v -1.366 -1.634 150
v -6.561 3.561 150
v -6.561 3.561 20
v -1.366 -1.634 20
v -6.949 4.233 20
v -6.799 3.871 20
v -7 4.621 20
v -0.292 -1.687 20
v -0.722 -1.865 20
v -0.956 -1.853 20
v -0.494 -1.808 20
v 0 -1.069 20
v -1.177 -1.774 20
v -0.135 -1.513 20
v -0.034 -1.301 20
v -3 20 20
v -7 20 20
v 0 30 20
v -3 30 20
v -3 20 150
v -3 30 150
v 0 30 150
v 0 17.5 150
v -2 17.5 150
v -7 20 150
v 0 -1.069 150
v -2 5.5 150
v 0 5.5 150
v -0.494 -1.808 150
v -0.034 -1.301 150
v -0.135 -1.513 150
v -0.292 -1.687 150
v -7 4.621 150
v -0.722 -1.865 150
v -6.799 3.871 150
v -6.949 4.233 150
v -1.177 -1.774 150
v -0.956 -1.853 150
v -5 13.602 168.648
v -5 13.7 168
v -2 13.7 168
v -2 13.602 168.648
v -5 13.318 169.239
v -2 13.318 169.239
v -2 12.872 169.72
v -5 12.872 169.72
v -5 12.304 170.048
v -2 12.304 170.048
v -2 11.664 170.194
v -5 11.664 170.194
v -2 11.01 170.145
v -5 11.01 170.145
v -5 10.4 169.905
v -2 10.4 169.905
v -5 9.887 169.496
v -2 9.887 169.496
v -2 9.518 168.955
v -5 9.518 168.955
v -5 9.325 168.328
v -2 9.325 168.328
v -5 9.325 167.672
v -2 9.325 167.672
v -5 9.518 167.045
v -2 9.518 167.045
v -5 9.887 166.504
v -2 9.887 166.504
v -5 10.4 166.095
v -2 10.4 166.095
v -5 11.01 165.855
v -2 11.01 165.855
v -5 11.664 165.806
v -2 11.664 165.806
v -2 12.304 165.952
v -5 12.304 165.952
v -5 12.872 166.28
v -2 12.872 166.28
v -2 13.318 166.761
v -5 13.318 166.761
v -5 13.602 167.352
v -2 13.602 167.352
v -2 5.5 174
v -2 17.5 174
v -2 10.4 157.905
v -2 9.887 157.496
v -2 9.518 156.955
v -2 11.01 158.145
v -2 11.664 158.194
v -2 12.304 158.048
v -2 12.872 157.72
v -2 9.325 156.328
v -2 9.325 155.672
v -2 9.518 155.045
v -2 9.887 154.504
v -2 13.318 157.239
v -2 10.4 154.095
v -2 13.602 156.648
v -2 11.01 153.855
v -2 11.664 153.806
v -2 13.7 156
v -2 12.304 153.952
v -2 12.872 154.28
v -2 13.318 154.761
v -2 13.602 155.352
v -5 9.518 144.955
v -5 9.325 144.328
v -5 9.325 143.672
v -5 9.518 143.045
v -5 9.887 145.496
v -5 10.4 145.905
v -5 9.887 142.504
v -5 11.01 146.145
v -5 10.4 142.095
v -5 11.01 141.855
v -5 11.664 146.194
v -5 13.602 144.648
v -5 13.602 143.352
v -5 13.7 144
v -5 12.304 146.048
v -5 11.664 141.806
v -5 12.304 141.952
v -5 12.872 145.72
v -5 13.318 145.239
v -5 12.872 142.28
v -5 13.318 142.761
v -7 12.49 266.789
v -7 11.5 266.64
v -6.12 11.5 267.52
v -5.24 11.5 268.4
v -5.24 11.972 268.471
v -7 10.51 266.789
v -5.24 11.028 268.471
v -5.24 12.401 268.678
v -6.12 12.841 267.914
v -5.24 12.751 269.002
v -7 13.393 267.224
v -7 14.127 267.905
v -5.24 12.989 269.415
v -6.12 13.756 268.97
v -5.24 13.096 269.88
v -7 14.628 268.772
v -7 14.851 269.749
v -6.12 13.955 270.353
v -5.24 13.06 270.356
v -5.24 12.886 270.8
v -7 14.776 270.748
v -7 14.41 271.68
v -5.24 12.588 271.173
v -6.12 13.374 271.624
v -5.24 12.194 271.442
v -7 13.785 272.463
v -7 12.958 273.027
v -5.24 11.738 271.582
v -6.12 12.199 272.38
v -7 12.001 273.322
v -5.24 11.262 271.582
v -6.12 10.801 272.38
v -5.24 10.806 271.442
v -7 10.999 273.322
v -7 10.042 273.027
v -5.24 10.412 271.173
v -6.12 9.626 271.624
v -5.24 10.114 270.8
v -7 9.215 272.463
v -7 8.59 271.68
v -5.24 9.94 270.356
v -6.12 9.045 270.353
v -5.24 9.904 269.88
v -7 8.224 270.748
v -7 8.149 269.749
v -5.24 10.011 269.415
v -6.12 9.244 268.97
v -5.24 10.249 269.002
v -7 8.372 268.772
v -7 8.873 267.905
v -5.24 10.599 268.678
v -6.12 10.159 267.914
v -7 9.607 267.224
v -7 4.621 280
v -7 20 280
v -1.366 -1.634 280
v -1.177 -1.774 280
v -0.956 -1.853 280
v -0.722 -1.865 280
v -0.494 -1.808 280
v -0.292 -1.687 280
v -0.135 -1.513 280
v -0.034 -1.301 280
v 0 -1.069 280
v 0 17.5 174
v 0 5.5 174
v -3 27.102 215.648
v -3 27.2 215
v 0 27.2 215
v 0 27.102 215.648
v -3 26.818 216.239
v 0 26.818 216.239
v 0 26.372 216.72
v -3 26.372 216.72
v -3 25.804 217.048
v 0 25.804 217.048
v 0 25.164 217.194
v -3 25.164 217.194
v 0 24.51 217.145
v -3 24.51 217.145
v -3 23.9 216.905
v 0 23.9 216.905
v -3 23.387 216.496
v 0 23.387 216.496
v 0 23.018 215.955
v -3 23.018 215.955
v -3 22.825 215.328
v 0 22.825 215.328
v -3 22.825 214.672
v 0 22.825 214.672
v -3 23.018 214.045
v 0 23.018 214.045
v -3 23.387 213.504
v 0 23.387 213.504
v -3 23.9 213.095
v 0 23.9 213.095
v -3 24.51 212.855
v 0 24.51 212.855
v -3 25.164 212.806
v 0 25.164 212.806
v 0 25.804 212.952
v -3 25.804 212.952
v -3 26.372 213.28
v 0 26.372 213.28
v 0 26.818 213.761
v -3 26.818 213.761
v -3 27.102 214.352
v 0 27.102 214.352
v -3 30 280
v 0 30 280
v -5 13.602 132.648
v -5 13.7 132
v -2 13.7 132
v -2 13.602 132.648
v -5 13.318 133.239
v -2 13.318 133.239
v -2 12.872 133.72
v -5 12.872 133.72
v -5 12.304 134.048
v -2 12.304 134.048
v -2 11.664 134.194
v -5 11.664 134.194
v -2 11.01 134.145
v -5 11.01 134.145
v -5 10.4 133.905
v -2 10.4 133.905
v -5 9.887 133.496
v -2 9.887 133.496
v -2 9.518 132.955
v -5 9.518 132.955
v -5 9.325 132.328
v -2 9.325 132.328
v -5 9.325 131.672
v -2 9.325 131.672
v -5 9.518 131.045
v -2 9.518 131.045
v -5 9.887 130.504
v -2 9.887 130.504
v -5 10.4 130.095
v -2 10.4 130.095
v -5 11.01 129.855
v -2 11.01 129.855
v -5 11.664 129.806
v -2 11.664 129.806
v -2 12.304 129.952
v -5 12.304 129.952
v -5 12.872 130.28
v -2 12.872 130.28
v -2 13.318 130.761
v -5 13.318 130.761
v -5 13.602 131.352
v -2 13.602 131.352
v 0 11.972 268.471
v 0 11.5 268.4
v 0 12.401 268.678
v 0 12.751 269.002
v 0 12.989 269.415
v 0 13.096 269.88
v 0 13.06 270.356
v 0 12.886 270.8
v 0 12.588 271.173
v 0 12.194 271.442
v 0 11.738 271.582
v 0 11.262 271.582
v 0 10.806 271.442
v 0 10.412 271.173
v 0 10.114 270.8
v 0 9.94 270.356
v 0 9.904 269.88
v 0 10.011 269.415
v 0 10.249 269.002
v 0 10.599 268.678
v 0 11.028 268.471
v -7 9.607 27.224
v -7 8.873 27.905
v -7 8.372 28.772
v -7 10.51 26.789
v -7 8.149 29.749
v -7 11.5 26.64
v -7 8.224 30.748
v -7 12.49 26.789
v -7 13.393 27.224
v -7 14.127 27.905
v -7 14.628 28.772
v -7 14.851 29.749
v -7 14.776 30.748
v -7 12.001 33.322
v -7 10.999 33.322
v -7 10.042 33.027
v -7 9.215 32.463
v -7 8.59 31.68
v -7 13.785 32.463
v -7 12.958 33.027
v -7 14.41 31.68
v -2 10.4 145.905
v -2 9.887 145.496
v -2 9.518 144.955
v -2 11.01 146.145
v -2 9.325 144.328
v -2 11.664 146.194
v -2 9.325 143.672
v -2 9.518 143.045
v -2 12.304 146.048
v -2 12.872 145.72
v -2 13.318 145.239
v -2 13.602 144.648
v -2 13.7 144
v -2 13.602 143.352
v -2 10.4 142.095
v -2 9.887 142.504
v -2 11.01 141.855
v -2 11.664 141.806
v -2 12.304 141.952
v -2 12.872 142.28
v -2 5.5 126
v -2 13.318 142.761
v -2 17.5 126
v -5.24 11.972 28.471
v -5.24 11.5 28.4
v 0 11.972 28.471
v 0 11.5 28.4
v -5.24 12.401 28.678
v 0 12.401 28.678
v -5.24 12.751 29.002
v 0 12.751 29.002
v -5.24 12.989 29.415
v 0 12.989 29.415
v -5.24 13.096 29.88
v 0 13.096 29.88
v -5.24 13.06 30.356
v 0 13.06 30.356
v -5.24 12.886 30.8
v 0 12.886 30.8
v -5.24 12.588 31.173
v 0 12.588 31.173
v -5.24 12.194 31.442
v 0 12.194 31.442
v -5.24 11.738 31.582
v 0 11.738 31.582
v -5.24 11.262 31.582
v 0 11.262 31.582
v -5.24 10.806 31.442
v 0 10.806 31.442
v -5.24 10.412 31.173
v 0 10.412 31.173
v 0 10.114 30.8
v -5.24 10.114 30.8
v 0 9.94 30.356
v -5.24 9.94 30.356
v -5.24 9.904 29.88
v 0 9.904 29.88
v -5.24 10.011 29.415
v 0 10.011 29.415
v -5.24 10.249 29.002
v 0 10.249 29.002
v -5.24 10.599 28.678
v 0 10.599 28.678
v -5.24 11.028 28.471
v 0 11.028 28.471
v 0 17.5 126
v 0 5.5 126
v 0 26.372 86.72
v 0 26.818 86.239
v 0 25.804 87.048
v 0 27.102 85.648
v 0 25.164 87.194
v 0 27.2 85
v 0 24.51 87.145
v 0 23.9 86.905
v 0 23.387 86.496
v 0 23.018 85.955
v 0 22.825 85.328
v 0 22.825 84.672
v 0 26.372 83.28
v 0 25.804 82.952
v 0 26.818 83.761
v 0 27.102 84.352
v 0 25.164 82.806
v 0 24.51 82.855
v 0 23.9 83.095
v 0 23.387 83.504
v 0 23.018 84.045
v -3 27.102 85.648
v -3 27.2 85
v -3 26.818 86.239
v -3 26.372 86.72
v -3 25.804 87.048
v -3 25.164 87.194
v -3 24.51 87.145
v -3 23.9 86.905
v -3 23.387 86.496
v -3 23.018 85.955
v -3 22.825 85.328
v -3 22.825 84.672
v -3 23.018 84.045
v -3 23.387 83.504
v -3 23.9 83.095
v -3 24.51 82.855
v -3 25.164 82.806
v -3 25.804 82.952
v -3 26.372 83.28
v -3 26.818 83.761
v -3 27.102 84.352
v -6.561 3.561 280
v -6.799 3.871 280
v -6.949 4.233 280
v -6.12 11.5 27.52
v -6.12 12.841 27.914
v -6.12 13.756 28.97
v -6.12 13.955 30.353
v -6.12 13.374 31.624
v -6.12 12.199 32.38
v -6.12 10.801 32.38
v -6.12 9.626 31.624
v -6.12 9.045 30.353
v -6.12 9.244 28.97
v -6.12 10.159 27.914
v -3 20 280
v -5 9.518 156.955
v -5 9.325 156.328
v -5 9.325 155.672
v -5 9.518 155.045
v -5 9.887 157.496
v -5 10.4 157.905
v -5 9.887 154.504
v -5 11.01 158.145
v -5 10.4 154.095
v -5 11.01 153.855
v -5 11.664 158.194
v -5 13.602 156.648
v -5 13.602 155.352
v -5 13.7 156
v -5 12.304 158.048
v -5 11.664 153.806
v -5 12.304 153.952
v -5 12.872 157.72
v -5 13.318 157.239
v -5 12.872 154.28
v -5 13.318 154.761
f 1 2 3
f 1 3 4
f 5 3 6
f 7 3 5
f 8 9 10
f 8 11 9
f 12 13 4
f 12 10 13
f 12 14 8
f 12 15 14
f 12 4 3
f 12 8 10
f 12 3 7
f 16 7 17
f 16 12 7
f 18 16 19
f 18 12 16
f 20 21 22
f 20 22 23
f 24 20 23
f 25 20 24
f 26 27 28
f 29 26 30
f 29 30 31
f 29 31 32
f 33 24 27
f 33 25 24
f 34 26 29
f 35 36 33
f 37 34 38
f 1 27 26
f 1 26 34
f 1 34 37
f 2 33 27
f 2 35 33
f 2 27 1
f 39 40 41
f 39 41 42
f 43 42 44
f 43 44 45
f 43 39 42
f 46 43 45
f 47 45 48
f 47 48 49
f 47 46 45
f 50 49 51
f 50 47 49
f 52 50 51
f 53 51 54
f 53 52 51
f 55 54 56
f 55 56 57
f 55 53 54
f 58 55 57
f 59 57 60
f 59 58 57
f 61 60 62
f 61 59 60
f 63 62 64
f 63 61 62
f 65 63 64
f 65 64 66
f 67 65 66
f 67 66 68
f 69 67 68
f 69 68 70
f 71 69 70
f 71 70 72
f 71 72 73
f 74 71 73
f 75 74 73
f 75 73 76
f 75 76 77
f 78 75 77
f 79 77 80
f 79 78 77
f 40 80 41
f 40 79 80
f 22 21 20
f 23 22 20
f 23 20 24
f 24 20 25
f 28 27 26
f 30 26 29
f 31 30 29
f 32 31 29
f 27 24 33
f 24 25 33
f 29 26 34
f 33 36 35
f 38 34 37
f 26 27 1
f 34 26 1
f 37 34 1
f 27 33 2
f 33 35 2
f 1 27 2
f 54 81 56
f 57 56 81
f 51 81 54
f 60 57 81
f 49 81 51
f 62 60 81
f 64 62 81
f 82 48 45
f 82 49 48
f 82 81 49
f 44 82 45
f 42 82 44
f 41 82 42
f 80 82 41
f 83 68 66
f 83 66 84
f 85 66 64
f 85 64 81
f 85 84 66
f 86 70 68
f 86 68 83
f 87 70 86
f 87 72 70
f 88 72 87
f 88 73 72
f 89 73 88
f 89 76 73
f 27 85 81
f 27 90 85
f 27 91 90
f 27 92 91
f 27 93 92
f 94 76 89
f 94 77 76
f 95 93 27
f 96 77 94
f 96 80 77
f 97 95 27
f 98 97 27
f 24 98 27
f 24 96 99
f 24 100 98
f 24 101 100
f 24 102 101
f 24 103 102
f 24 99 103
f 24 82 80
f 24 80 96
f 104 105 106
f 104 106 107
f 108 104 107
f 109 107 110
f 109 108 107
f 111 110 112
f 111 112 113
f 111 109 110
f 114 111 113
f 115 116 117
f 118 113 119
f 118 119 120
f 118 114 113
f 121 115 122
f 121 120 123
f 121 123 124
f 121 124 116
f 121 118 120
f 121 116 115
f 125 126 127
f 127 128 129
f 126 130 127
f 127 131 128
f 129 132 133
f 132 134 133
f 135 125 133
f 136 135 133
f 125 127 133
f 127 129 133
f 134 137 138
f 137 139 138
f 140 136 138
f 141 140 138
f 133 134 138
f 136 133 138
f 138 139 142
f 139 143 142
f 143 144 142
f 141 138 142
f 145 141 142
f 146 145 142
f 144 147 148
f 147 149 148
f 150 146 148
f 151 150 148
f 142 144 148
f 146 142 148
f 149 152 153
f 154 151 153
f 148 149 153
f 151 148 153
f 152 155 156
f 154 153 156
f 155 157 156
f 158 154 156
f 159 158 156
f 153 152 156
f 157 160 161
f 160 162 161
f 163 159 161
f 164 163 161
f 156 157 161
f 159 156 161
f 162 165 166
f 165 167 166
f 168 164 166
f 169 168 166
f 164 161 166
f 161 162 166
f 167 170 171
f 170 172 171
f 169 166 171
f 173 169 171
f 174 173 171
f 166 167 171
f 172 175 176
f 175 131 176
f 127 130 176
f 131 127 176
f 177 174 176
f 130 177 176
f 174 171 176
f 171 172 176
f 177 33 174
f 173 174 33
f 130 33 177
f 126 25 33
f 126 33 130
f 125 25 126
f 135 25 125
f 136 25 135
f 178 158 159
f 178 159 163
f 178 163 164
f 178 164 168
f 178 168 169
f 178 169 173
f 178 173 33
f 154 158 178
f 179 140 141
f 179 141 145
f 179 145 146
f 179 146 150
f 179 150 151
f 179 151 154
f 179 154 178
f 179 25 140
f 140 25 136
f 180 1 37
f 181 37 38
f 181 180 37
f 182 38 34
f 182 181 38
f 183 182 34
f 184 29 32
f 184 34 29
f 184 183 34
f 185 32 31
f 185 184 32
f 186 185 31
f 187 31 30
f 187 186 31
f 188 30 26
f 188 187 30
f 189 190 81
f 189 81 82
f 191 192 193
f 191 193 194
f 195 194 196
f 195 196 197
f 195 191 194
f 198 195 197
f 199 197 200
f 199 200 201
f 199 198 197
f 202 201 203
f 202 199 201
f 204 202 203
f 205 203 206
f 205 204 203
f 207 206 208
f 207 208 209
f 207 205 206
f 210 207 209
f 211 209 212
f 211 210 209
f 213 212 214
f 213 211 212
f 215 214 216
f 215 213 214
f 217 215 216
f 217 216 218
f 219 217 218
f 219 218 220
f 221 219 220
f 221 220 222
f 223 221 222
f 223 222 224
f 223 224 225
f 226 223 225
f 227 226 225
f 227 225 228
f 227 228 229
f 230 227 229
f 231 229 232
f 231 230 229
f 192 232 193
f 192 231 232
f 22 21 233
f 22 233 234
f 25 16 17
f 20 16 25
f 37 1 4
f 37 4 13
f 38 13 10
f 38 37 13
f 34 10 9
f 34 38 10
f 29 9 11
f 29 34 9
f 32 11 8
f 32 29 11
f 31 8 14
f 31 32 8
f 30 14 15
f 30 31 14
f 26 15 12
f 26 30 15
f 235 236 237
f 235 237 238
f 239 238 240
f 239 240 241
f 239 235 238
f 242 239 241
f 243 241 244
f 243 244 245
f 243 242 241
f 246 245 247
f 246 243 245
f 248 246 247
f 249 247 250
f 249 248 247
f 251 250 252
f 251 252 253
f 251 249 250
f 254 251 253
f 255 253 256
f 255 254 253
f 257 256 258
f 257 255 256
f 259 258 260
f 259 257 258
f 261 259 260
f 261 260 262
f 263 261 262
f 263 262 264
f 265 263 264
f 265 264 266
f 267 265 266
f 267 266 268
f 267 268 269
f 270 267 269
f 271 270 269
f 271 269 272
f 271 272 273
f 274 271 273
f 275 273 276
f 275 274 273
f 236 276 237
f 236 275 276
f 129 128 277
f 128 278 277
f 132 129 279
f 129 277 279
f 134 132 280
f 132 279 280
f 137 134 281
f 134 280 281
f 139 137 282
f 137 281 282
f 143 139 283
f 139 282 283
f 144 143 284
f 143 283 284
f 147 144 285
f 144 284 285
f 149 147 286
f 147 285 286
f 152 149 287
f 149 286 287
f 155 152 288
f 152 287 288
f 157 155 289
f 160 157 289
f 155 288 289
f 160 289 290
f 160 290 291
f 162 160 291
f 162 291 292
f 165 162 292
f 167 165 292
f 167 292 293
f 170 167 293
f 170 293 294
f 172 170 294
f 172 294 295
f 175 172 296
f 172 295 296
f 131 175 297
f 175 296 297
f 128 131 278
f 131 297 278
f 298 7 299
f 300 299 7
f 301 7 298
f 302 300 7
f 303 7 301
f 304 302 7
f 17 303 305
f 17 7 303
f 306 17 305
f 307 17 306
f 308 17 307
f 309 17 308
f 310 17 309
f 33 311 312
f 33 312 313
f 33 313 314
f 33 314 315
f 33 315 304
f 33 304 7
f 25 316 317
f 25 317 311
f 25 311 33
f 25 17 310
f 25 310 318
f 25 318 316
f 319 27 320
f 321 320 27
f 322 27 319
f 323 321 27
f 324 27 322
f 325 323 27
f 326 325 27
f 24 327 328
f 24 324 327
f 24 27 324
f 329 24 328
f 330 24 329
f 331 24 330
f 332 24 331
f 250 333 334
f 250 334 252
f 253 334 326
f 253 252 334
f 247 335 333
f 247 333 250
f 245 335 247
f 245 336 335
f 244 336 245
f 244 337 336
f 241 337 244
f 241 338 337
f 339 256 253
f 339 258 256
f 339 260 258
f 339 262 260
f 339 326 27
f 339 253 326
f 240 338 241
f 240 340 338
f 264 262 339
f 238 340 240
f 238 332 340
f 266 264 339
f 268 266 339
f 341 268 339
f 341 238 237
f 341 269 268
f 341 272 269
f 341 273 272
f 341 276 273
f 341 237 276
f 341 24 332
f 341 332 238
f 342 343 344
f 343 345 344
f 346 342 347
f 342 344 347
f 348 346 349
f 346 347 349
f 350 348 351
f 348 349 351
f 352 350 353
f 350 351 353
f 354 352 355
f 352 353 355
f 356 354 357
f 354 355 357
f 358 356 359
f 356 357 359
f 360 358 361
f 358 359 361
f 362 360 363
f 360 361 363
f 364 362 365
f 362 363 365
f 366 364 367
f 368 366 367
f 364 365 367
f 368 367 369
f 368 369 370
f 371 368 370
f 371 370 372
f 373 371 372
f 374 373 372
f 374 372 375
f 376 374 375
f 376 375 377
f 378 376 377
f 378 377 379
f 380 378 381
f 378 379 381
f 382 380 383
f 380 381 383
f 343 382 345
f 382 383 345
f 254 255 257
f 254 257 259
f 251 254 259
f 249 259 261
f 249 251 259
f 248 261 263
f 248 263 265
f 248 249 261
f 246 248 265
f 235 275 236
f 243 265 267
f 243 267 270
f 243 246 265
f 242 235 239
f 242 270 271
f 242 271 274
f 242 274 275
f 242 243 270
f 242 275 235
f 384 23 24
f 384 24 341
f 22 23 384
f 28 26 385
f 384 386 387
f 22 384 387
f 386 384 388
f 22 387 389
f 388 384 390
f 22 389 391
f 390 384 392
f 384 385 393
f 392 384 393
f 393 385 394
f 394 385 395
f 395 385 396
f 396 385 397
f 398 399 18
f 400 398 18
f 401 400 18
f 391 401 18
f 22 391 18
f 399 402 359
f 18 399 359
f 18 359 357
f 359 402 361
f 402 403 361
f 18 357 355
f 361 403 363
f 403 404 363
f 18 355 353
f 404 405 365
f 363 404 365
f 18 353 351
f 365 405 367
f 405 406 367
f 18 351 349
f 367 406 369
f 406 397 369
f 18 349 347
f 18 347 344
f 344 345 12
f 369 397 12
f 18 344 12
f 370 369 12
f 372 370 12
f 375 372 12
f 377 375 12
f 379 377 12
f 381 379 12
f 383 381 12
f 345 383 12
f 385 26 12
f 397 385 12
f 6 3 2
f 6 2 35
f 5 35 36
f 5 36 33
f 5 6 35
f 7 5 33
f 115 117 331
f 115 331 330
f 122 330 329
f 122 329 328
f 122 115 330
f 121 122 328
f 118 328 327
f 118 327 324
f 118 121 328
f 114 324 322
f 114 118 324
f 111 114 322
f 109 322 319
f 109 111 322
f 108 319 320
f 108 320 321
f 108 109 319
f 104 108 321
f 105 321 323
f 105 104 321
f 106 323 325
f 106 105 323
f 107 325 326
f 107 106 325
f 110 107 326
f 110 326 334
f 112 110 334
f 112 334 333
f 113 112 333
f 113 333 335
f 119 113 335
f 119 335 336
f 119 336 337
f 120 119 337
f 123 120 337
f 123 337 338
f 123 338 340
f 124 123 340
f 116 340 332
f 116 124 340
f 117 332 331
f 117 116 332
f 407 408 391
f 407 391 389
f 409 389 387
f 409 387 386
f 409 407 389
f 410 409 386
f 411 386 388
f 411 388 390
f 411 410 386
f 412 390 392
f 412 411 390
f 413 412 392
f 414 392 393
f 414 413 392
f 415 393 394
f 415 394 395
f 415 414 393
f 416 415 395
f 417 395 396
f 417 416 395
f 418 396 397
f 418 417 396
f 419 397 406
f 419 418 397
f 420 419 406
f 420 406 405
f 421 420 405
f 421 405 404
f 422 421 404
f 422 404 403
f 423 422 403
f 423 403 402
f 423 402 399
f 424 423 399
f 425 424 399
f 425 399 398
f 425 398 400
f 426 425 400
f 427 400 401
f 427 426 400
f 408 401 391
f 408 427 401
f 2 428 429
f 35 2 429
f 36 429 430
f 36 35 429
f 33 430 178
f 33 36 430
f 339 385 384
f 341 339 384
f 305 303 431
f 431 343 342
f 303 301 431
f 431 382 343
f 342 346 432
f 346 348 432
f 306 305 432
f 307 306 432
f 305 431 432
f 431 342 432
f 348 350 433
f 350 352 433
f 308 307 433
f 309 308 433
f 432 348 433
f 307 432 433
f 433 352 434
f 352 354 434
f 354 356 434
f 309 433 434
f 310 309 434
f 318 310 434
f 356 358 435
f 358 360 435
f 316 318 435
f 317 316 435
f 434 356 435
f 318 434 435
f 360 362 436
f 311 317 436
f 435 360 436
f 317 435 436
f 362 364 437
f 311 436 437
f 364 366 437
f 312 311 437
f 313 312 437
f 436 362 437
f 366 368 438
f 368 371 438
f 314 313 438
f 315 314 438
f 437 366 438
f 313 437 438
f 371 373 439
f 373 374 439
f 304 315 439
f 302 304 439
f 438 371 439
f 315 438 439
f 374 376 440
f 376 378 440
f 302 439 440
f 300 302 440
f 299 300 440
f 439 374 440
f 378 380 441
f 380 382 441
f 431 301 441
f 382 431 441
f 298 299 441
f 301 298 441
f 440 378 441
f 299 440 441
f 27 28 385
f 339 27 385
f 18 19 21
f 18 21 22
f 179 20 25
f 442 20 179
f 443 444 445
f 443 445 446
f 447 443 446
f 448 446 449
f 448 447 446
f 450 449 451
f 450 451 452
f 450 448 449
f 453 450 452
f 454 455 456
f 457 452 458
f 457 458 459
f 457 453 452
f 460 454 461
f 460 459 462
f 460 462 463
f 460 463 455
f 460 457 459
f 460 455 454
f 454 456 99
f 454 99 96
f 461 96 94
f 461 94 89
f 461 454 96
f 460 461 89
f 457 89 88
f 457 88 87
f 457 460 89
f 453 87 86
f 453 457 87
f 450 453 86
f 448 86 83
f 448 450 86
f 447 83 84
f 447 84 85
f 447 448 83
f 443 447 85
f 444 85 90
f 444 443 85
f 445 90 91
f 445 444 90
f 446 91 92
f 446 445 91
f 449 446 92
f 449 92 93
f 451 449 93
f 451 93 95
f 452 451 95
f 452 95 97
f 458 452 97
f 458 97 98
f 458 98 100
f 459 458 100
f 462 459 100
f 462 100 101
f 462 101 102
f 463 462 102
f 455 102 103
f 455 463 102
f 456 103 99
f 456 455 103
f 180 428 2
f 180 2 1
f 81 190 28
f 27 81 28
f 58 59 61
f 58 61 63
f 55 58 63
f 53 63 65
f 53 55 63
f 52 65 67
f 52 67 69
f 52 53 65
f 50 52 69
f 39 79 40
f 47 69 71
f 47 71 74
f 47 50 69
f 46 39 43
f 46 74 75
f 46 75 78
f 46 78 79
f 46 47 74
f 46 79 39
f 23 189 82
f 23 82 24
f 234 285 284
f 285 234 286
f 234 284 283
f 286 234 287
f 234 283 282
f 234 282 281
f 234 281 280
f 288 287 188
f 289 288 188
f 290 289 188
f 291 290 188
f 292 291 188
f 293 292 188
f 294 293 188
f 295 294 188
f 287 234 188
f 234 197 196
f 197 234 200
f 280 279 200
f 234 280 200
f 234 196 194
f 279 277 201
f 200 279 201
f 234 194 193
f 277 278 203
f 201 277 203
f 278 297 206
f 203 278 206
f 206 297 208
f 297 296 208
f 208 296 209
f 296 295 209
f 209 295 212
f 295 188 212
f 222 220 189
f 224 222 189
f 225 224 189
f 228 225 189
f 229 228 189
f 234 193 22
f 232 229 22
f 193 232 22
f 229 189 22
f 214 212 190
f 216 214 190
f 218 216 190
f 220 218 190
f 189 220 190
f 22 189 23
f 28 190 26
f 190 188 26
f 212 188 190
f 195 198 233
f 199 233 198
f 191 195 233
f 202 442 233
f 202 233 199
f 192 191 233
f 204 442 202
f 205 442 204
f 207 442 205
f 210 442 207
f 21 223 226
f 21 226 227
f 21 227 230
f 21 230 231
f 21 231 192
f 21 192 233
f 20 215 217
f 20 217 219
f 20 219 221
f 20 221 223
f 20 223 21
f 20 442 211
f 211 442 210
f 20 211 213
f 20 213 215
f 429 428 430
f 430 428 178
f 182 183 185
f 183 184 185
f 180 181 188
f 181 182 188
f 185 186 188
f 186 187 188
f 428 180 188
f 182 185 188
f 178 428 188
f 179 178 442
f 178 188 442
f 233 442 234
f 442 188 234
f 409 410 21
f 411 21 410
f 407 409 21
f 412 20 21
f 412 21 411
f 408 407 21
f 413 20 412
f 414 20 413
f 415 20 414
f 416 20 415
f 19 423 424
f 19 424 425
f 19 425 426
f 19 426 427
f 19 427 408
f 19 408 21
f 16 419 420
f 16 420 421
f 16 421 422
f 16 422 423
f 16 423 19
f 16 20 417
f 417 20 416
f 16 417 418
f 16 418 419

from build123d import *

# Parameters (mm, degrees)
BOSS_EXTRUDE1_DEPTH                = 260
FILLET1_R                          = 1.5
SKETCH2_W                          = 20
SKETCH2_H                          = 260
CUT_EXTRUDE1_DEPTH                 = 10
FILLET2_R                          = 0.8
SKETCH4_W                          = 3
SKETCH4_H                          = 260
BOSS_EXTRUDE2_DEPTH                = 10
SKETCH3_W                          = 260
SKETCH3_H                          = 13
BOSS_EXTRUDE3_DEPTH                = 4
CSK_FOR_M3_SFHCS1_D                = 3.2
CSK_FOR_M3_SFHCS1_CSINK_D          = 6.72
CSK_FOR_M3_SFHCS1_CSINK_ANGLE      = 90
SPLIT1_SURFACE_1_BACK              = 263.039
SPLIT1_SURFACE_1_DEPTH             = 526.078
SPLIT1_SURFACE_2_BACK              = 263.039
SPLIT1_SURFACE_2_DEPTH             = 526.078
F_4_4_START                        = -3
F_4_4_4_4_DIAMETER_HOLE1_OUTLINE_R = 2.2
F_4_4_4_4_DIAMETER_HOLE1_DEPTH     = 3
SKETCH12_W                         = 48
SKETCH12_H                         = 12
CUT_EXTRUDE2_DEPTH                 = 2
F_4_4_START_2                      = -5
F_4_4_4_4_DIAMETER_HOLE2_OUTLINE_R = 2.2
F_4_4_4_4_DIAMETER_HOLE2_DEPTH     = 3


# Read off the part's stored shape, not the designer's step: Ø4.4 (4.4) Diameter Hole1, Ø4.4 (4.4) Diameter Hole2
with BuildPart() as part:
    # Sketch1 → Boss-Extrude1 (new body)
    with BuildSketch(Plane.XY.offset(280)):
        Polygon((-7, 4), (4, -7), (7, -7), (7, -3), (20, -3), (20, 0), (0, 0), (0, 20), (-3, 20), (-3, 7), (-7, 7), align=None)
    extrude(amount=-BOSS_EXTRUDE1_DEPTH)

    # Fillet1
    fillet1_edges = [part.edges().sort_by_distance(p)[0] for p in [
        (4, -7, 150),
        (-7, 4, 150),
    ]]
    fillet(fillet1_edges, radius=FILLET1_R)

    # Sketch2 → Cut-Extrude1 (cut)
    with BuildSketch(Plane(origin=(0, 0, 0), x_dir=(1, 0, 0), z_dir=(0, 1, 0))):
        with Locations((10, -150)):
            Rectangle(SKETCH2_W, SKETCH2_H)
    extrude(amount=-CUT_EXTRUDE1_DEPTH, mode=Mode.SUBTRACT)

    # Fillet2
    fillet2_edges = [part.edges().sort_by_distance(p)[0] for p in [
        (0, -3, 150),
    ]]
    fillet(fillet2_edges, radius=FILLET2_R)

    # Sketch4 → Boss-Extrude2 (add)
    with BuildSketch(Plane(origin=(0, 20, 0), x_dir=(1, 0, 0), z_dir=(0, 1, 0))):
        with Locations((-1.5, -150)):
            Rectangle(SKETCH4_W, SKETCH4_H)
    extrude(amount=BOSS_EXTRUDE2_DEPTH)

    # Sketch3 → Boss-Extrude3 (add)
    with BuildSketch(Plane.ZY.offset(3)):
        with Locations((150, 13.5)):
            Rectangle(SKETCH3_W, SKETCH3_H)
    extrude(amount=BOSS_EXTRUDE3_DEPTH)

    # CSK for M3 SFHCS1 (through all)
    with Locations(Plane.ZY.offset(7)):
        with Locations((30, 11.5), (270, 11.5)):
            CounterSinkHole(CSK_FOR_M3_SFHCS1_D / 2, CSK_FOR_M3_SFHCS1_CSINK_D / 2, counter_sink_angle=CSK_FOR_M3_SFHCS1_CSINK_ANGLE)


with BuildPart() as body_2:
    # Split1: the piece behind the surface
    add(part.part)
    # Split1 surface: a surface, the sketch's curves swept straight by 526.078 mm
    with BuildLine(Plane(origin=(0, 0, 0), x_dir=(0, 0, -1), z_dir=(1, 0, 0)).offset(-SPLIT1_SURFACE_1_BACK), mode=Mode.PRIVATE) as split1_surface_1_path:
        Line((-150, 30), (-150, -1.86862915))
    split1_surface_1 = Shell.extrude(split1_surface_1_path.wire(), (1 * SPLIT1_SURFACE_1_DEPTH, 0 * SPLIT1_SURFACE_1_DEPTH, 0 * SPLIT1_SURFACE_1_DEPTH))
    split(bisect_by=split1_surface_1, keep=Keep.BOTTOM)


with BuildPart() as part_1:
    add(part.part)

    # Split1: split by a surface, the side it looks to stays
    # Split1 surface: a surface, the sketch's curves swept straight by 526.078 mm
    with BuildLine(Plane(origin=(0, 0, 0), x_dir=(0, 0, -1), z_dir=(1, 0, 0)).offset(-SPLIT1_SURFACE_2_BACK), mode=Mode.PRIVATE) as split1_surface_2_path:
        Line((-150, 30), (-150, -1.86862915))
    split1_surface_2 = Shell.extrude(split1_surface_2_path.wire(), (1 * SPLIT1_SURFACE_2_DEPTH, 0 * SPLIT1_SURFACE_2_DEPTH, 0 * SPLIT1_SURFACE_2_DEPTH))
    split(bisect_by=split1_surface_2, keep=Keep.TOP)


with BuildPart() as f_4_4_4_4_diameter_hole1_tool:
    # Ø4.4 (4.4) Diameter Hole1 outline → Ø4.4 (4.4) Diameter Hole1 (new body)
    with BuildSketch(Plane.YZ.offset(F_4_4_START)):
        with Locations((25, 85)):
            Circle(F_4_4_4_4_DIAMETER_HOLE1_OUTLINE_R)
        with Locations((25, 215)):
            Circle(F_4_4_4_4_DIAMETER_HOLE1_OUTLINE_R)
    extrude(amount=F_4_4_4_4_DIAMETER_HOLE1_DEPTH)


with BuildPart() as part_2:
    add(part_1.part)

    # Ø4.4 (4.4) Diameter Hole1: cut by f_4_4_4_4_diameter_hole1_tool
    add(f_4_4_4_4_diameter_hole1_tool.part, mode=Mode.SUBTRACT)


with BuildPart() as body_2_1:
    add(body_2.part)

    # Ø4.4 (4.4) Diameter Hole1: cut by f_4_4_4_4_diameter_hole1_tool
    add(f_4_4_4_4_diameter_hole1_tool.part, mode=Mode.SUBTRACT)


with BuildPart() as cut_extrude2_tool:
    # Sketch12 → Cut-Extrude2 (new body)
    with BuildSketch(Plane(origin=(0, 0, 0), x_dir=(0, 0, -1), z_dir=(1, 0, 0))):
        with Locations((-150, 11.5)):
            Rectangle(SKETCH12_W, SKETCH12_H)
    extrude(amount=-CUT_EXTRUDE2_DEPTH)


with BuildPart() as part_3:
    add(part_2.part)

    # Cut-Extrude2: cut by cut_extrude2_tool
    add(cut_extrude2_tool.part, mode=Mode.SUBTRACT)


with BuildPart() as body_2_2:
    add(body_2_1.part)

    # Cut-Extrude2: cut by cut_extrude2_tool
    add(cut_extrude2_tool.part, mode=Mode.SUBTRACT)


with BuildPart() as f_4_4_4_4_diameter_hole2_tool:
    # Ø4.4 (4.4) Diameter Hole2 outline → Ø4.4 (4.4) Diameter Hole2 (new body)
    with BuildSketch(Plane.YZ.offset(F_4_4_START_2)):
        with Locations((11.5, 132)):
            Circle(F_4_4_4_4_DIAMETER_HOLE2_OUTLINE_R)
        with Locations((11.5, 144)):
            Circle(F_4_4_4_4_DIAMETER_HOLE2_OUTLINE_R)
        with Locations((11.5, 168)):
            Circle(F_4_4_4_4_DIAMETER_HOLE2_OUTLINE_R)
        with Locations((11.5, 156)):
            Circle(F_4_4_4_4_DIAMETER_HOLE2_OUTLINE_R)
    extrude(amount=F_4_4_4_4_DIAMETER_HOLE2_DEPTH)


with BuildPart() as part_4:
    add(part_3.part)

    # Ø4.4 (4.4) Diameter Hole2: cut by f_4_4_4_4_diameter_hole2_tool
    add(f_4_4_4_4_diameter_hole2_tool.part, mode=Mode.SUBTRACT)


with BuildPart() as body_2_3:
    add(body_2_2.part)

    # Ø4.4 (4.4) Diameter Hole2: cut by f_4_4_4_4_diameter_hole2_tool
    add(f_4_4_4_4_diameter_hole2_tool.part, mode=Mode.SUBTRACT)


solid = Compound([part_4.part, body_2_3.part])
